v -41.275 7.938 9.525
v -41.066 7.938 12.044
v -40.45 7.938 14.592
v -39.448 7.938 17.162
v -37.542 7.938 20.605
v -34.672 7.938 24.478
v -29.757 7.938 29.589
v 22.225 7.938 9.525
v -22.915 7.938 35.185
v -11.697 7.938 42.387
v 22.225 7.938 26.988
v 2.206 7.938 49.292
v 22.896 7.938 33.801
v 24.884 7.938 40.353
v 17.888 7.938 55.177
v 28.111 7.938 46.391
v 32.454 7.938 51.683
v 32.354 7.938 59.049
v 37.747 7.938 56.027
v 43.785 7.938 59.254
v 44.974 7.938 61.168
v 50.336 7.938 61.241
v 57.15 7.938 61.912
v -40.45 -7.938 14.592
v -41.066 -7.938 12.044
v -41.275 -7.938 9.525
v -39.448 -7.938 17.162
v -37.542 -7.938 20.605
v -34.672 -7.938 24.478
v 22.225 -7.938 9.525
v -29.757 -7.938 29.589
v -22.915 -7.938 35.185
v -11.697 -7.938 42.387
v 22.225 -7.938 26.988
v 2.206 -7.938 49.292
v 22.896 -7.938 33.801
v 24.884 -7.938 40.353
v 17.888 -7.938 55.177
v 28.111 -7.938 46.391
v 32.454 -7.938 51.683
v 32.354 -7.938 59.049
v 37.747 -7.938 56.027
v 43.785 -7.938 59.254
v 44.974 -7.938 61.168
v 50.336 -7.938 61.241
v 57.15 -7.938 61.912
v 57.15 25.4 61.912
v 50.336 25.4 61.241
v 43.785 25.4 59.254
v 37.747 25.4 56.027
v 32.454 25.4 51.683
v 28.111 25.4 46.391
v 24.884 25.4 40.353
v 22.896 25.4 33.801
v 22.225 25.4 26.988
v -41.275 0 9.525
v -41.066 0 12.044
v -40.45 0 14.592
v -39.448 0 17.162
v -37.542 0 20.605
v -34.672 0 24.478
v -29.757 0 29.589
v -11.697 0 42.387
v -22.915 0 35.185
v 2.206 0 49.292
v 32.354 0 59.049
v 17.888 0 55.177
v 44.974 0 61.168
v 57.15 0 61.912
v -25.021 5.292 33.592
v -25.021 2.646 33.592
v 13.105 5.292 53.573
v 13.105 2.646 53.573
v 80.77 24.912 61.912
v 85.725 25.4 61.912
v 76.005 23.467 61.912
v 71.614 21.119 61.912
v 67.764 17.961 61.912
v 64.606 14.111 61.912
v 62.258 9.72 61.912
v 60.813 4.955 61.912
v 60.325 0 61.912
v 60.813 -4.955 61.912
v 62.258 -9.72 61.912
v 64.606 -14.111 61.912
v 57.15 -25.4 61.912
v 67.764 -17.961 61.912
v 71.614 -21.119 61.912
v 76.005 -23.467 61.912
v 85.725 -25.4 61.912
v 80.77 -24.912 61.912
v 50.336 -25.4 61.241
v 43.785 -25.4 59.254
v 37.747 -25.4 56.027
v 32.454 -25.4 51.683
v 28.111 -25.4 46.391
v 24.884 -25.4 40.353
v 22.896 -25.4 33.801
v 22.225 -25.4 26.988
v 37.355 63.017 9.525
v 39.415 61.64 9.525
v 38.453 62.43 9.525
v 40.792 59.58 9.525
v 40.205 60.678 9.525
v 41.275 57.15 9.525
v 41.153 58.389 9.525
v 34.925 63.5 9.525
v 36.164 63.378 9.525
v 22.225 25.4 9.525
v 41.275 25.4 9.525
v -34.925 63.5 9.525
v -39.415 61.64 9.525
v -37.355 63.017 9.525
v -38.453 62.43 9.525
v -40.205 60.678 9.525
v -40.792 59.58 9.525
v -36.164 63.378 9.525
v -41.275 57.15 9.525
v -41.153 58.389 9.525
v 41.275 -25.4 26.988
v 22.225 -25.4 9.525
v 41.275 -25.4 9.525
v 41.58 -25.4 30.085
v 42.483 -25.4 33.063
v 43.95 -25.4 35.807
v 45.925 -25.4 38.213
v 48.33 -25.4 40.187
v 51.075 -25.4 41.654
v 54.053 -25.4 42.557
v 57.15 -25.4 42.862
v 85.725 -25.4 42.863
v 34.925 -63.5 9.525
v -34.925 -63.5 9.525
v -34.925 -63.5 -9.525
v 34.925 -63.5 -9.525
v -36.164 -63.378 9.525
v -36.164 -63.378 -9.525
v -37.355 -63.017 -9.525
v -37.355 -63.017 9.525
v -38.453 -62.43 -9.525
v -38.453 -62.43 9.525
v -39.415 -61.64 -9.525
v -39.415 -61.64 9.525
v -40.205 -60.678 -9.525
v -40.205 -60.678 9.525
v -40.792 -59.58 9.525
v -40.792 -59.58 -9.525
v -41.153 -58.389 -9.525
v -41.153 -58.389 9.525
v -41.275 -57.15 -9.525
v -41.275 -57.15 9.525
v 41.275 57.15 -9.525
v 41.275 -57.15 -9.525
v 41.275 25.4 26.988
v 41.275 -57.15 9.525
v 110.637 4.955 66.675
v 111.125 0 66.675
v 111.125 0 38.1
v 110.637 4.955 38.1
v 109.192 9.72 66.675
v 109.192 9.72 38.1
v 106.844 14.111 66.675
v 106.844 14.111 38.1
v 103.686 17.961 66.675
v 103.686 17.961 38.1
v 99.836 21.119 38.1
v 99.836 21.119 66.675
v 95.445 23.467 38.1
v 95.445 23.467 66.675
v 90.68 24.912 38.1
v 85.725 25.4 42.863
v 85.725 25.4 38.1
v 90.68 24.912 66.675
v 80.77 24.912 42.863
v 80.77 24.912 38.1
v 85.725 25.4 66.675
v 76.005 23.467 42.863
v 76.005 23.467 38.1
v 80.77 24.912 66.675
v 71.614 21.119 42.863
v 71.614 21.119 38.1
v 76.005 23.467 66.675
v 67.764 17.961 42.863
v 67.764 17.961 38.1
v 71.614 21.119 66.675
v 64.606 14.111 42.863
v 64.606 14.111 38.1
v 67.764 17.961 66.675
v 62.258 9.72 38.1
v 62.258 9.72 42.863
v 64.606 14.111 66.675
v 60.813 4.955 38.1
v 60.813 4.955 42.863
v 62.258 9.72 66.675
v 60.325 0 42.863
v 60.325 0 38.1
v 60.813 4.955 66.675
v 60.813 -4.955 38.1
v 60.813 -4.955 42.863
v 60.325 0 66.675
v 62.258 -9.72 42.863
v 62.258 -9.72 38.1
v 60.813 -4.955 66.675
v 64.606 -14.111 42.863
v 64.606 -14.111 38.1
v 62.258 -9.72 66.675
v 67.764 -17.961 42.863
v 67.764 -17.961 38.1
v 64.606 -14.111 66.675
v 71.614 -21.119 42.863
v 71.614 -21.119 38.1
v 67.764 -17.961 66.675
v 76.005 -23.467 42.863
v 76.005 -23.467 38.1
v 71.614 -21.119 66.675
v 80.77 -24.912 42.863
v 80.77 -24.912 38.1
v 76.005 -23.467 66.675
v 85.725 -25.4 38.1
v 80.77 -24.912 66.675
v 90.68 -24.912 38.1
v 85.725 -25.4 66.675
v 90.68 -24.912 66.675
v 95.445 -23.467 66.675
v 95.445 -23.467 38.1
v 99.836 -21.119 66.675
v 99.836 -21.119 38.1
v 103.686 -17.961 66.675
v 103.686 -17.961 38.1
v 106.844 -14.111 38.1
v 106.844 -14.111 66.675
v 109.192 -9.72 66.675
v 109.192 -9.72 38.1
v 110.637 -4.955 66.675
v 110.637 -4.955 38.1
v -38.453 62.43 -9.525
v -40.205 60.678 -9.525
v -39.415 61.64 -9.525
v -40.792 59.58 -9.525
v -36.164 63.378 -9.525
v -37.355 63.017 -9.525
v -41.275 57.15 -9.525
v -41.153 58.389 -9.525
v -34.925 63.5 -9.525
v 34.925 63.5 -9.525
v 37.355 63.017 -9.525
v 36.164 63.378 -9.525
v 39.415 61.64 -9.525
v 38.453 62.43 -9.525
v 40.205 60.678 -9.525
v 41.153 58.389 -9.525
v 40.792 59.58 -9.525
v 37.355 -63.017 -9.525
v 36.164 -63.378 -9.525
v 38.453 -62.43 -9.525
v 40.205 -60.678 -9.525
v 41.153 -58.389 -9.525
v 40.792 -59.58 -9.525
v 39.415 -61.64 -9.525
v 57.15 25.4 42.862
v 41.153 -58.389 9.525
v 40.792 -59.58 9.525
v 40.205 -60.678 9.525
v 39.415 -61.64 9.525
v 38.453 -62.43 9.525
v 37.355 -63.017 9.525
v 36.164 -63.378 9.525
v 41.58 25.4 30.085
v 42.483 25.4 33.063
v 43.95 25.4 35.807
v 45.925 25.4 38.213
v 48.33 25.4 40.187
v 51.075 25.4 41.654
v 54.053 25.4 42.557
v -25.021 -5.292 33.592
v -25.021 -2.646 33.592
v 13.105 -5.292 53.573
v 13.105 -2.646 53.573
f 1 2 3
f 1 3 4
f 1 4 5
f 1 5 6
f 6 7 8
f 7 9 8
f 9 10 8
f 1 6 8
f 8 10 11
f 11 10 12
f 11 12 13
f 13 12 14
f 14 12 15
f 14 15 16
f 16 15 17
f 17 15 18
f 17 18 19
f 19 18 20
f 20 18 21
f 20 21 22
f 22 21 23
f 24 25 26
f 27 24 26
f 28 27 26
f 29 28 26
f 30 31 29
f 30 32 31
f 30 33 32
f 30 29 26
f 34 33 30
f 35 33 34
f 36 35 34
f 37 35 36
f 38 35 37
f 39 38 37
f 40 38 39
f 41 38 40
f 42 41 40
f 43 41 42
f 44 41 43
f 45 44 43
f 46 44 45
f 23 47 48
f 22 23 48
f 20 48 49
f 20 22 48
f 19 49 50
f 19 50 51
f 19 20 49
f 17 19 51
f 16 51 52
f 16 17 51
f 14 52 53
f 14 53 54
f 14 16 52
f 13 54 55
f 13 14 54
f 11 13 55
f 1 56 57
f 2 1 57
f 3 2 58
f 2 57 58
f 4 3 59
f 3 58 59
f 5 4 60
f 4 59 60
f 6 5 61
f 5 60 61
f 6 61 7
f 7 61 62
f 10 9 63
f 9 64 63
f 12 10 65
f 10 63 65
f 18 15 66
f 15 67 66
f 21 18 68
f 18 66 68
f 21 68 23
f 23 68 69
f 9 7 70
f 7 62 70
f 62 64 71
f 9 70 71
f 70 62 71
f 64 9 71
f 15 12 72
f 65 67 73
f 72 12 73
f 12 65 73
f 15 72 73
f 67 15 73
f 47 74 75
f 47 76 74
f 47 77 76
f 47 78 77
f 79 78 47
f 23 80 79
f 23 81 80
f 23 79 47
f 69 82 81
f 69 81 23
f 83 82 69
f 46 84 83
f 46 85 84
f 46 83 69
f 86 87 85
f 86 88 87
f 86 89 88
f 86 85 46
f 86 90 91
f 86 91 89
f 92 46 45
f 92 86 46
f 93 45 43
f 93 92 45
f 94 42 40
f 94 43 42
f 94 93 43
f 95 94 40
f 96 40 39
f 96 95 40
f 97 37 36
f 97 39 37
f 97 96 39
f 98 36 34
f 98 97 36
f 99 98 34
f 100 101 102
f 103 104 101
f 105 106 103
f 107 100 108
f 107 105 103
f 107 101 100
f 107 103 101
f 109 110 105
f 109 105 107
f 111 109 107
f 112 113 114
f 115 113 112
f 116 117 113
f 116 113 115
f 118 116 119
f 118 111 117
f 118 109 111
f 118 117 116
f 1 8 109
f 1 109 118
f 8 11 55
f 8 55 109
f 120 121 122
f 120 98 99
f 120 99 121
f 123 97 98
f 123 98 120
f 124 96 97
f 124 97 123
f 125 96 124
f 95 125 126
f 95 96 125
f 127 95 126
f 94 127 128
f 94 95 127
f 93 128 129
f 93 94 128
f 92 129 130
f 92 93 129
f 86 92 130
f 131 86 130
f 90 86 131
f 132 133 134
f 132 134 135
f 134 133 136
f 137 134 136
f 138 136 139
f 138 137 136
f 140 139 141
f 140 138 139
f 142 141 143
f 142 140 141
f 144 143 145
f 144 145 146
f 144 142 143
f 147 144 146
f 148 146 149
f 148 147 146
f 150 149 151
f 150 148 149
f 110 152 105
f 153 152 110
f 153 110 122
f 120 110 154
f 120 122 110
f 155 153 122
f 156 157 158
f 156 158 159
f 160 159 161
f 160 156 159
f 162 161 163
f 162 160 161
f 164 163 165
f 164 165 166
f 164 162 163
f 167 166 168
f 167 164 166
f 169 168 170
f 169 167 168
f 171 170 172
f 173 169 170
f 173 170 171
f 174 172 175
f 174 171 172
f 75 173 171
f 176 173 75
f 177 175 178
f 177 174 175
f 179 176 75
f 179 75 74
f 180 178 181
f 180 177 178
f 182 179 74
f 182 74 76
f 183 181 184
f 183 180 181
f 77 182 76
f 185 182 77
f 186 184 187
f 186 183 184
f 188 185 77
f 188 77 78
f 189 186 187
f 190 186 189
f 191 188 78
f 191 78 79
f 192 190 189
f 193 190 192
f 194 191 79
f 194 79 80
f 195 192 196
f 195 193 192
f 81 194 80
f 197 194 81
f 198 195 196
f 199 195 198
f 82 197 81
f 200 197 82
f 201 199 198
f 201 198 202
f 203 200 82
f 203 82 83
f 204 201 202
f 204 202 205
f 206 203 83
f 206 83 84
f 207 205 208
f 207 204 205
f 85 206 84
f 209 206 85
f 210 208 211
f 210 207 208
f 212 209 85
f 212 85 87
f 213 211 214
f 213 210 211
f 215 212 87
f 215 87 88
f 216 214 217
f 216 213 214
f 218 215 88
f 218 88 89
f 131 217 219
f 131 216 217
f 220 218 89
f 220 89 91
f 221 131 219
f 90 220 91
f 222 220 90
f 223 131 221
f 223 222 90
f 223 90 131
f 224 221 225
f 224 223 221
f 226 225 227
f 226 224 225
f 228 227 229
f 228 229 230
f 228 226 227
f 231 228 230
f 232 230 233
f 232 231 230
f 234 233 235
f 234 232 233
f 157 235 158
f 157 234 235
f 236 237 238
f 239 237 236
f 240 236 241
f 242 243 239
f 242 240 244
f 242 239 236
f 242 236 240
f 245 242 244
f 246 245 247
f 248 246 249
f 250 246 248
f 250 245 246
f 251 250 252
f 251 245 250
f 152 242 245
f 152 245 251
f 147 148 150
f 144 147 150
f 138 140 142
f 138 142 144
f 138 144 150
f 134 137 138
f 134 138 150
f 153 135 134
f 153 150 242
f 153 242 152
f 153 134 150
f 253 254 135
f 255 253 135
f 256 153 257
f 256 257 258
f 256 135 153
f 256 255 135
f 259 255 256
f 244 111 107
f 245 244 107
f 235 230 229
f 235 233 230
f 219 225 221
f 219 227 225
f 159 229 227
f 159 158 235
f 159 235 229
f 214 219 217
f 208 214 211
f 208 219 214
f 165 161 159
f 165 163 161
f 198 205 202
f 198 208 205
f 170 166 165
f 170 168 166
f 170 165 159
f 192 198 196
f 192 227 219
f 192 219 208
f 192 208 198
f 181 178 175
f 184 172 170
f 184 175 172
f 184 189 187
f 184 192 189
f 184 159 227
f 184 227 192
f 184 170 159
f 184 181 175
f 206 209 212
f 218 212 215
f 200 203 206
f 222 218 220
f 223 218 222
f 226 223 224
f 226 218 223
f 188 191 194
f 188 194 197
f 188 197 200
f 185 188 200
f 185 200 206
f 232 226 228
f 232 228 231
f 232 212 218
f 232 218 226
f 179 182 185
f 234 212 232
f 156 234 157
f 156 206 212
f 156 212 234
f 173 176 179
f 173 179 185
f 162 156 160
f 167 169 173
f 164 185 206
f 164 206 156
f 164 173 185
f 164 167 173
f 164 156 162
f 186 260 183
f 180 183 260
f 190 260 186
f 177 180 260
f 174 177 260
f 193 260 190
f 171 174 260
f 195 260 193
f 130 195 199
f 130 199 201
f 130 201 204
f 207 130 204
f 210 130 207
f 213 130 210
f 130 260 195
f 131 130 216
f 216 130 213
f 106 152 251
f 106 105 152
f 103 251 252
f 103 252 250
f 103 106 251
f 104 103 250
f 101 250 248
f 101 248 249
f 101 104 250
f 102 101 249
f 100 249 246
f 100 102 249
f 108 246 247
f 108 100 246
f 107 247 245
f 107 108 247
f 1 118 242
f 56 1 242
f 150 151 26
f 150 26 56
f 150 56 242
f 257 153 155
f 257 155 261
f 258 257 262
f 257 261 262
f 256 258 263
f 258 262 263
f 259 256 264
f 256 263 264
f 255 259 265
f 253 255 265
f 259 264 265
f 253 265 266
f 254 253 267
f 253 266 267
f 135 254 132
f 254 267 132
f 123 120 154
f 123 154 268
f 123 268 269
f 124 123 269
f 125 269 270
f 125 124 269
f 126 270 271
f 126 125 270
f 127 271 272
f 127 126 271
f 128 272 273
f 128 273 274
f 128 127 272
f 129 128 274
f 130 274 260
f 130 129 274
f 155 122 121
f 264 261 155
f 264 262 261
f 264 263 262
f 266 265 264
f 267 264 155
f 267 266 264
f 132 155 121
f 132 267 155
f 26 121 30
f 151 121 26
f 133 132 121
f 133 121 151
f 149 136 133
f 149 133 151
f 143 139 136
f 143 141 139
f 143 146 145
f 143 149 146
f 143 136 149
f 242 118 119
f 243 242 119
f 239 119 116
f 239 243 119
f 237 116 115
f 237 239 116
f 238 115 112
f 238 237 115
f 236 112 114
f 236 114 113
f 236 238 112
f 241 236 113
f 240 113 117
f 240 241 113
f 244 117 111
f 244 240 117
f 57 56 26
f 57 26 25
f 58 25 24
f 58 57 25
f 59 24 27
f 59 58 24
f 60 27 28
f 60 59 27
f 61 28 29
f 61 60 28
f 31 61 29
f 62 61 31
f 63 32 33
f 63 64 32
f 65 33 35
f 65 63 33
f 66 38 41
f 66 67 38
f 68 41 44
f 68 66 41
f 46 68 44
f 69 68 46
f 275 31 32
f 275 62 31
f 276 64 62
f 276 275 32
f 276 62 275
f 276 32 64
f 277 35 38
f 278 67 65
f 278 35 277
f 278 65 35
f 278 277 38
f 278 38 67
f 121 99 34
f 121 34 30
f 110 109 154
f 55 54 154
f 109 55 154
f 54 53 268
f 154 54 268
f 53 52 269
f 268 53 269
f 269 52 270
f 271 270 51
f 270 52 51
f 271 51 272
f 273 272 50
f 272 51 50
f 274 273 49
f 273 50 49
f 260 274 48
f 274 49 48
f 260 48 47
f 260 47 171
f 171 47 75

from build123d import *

# Parameters (mm, degrees)
F1_DEPTH = 63.5
F0_W     = 25.4
F0_H     = 19.05
F2_DEPTH = 25.4
F4_DEPTH = 7.9375
F5_R     = 6.35


with BuildPart() as f1:
    # F0 (on Front) → F1 (new body, symmetric)
    with BuildSketch(Plane.XZ):
        Polygon((41.275, -9.525), (41.275, 9.525), (22.225, 9.525), (-41.275, 9.525), (-41.275, -9.525), align=None)
    extrude(amount=F1_DEPTH, both=True)

    # F0 (on Front) → F2 (join, symmetric)
    with BuildSketch(Plane.XZ):
        with BuildLine():
            Line((22.225, 9.525), (41.275, 9.525))
            Line((41.275, 9.525), (41.275, 26.9875))
            ThreePointArc((41.275, 26.9875), (45.9246798487, 38.2128201513), (57.15, 42.8625))
            Line((57.15, 42.8625), (60.325, 42.8625))
            Line((60.325, 42.8625), (60.325, 61.9125))
            Line((60.325, 61.9125), (57.15, 61.9125))
            ThreePointArc((57.15, 61.9125), (32.4542956671, 51.6832043329), (22.225, 26.9875))
            Line((22.225, 26.9875), (22.225, 9.525))
        make_face()
        with Locations((73.025, 52.3875)):
            Rectangle(F0_W, F0_H)
    extrude(amount=F2_DEPTH, both=True)

    # F0 (on Front) → F3 (revolve)
    with BuildSketch(Plane.XZ):
        Polygon((85.725, 61.9125), (85.725, 42.8625), (85.725, 38.1), (111.125, 38.1), (111.125, 66.675), (85.725, 66.675), align=None)
    revolve(axis=Axis((85.725, 0, 52.3875), (0, 0, 1)))

    # F0 (on Front) → F4 (join, symmetric)
    with BuildSketch(Plane.XZ):
        with BuildLine():
            Line((-41.275, 9.525), (22.225, 9.525))
            Line((22.225, 9.525), (22.225, 26.9875))
            ThreePointArc((22.225, 26.9875), (32.4542956671, 51.6832043329), (57.15, 61.9125))
            add(Edge.make_bspline(
                [(-41.275, 9.525), (-41.275, 33.1159606576), (15.4643859714, 61.9125), (57.15, 61.9125)],
                knots=[0, 0, 0, 0, 111.4985685166, 111.4985685166, 111.4985685166, 111.4985685166], degree=3))
        make_face()
    extrude(amount=F4_DEPTH, both=True)

    # F5
    f5_edges = [f1.edges().sort_by_distance(p)[0] for p in [
        (-41.275, -63.5, 0),
        (41.275, -63.5, 0),
        (-41.275, 63.5, 0),
        (41.275, 63.5, 0),
    ]]
    fillet(f5_edges, radius=F5_R)


solid = f1.part
